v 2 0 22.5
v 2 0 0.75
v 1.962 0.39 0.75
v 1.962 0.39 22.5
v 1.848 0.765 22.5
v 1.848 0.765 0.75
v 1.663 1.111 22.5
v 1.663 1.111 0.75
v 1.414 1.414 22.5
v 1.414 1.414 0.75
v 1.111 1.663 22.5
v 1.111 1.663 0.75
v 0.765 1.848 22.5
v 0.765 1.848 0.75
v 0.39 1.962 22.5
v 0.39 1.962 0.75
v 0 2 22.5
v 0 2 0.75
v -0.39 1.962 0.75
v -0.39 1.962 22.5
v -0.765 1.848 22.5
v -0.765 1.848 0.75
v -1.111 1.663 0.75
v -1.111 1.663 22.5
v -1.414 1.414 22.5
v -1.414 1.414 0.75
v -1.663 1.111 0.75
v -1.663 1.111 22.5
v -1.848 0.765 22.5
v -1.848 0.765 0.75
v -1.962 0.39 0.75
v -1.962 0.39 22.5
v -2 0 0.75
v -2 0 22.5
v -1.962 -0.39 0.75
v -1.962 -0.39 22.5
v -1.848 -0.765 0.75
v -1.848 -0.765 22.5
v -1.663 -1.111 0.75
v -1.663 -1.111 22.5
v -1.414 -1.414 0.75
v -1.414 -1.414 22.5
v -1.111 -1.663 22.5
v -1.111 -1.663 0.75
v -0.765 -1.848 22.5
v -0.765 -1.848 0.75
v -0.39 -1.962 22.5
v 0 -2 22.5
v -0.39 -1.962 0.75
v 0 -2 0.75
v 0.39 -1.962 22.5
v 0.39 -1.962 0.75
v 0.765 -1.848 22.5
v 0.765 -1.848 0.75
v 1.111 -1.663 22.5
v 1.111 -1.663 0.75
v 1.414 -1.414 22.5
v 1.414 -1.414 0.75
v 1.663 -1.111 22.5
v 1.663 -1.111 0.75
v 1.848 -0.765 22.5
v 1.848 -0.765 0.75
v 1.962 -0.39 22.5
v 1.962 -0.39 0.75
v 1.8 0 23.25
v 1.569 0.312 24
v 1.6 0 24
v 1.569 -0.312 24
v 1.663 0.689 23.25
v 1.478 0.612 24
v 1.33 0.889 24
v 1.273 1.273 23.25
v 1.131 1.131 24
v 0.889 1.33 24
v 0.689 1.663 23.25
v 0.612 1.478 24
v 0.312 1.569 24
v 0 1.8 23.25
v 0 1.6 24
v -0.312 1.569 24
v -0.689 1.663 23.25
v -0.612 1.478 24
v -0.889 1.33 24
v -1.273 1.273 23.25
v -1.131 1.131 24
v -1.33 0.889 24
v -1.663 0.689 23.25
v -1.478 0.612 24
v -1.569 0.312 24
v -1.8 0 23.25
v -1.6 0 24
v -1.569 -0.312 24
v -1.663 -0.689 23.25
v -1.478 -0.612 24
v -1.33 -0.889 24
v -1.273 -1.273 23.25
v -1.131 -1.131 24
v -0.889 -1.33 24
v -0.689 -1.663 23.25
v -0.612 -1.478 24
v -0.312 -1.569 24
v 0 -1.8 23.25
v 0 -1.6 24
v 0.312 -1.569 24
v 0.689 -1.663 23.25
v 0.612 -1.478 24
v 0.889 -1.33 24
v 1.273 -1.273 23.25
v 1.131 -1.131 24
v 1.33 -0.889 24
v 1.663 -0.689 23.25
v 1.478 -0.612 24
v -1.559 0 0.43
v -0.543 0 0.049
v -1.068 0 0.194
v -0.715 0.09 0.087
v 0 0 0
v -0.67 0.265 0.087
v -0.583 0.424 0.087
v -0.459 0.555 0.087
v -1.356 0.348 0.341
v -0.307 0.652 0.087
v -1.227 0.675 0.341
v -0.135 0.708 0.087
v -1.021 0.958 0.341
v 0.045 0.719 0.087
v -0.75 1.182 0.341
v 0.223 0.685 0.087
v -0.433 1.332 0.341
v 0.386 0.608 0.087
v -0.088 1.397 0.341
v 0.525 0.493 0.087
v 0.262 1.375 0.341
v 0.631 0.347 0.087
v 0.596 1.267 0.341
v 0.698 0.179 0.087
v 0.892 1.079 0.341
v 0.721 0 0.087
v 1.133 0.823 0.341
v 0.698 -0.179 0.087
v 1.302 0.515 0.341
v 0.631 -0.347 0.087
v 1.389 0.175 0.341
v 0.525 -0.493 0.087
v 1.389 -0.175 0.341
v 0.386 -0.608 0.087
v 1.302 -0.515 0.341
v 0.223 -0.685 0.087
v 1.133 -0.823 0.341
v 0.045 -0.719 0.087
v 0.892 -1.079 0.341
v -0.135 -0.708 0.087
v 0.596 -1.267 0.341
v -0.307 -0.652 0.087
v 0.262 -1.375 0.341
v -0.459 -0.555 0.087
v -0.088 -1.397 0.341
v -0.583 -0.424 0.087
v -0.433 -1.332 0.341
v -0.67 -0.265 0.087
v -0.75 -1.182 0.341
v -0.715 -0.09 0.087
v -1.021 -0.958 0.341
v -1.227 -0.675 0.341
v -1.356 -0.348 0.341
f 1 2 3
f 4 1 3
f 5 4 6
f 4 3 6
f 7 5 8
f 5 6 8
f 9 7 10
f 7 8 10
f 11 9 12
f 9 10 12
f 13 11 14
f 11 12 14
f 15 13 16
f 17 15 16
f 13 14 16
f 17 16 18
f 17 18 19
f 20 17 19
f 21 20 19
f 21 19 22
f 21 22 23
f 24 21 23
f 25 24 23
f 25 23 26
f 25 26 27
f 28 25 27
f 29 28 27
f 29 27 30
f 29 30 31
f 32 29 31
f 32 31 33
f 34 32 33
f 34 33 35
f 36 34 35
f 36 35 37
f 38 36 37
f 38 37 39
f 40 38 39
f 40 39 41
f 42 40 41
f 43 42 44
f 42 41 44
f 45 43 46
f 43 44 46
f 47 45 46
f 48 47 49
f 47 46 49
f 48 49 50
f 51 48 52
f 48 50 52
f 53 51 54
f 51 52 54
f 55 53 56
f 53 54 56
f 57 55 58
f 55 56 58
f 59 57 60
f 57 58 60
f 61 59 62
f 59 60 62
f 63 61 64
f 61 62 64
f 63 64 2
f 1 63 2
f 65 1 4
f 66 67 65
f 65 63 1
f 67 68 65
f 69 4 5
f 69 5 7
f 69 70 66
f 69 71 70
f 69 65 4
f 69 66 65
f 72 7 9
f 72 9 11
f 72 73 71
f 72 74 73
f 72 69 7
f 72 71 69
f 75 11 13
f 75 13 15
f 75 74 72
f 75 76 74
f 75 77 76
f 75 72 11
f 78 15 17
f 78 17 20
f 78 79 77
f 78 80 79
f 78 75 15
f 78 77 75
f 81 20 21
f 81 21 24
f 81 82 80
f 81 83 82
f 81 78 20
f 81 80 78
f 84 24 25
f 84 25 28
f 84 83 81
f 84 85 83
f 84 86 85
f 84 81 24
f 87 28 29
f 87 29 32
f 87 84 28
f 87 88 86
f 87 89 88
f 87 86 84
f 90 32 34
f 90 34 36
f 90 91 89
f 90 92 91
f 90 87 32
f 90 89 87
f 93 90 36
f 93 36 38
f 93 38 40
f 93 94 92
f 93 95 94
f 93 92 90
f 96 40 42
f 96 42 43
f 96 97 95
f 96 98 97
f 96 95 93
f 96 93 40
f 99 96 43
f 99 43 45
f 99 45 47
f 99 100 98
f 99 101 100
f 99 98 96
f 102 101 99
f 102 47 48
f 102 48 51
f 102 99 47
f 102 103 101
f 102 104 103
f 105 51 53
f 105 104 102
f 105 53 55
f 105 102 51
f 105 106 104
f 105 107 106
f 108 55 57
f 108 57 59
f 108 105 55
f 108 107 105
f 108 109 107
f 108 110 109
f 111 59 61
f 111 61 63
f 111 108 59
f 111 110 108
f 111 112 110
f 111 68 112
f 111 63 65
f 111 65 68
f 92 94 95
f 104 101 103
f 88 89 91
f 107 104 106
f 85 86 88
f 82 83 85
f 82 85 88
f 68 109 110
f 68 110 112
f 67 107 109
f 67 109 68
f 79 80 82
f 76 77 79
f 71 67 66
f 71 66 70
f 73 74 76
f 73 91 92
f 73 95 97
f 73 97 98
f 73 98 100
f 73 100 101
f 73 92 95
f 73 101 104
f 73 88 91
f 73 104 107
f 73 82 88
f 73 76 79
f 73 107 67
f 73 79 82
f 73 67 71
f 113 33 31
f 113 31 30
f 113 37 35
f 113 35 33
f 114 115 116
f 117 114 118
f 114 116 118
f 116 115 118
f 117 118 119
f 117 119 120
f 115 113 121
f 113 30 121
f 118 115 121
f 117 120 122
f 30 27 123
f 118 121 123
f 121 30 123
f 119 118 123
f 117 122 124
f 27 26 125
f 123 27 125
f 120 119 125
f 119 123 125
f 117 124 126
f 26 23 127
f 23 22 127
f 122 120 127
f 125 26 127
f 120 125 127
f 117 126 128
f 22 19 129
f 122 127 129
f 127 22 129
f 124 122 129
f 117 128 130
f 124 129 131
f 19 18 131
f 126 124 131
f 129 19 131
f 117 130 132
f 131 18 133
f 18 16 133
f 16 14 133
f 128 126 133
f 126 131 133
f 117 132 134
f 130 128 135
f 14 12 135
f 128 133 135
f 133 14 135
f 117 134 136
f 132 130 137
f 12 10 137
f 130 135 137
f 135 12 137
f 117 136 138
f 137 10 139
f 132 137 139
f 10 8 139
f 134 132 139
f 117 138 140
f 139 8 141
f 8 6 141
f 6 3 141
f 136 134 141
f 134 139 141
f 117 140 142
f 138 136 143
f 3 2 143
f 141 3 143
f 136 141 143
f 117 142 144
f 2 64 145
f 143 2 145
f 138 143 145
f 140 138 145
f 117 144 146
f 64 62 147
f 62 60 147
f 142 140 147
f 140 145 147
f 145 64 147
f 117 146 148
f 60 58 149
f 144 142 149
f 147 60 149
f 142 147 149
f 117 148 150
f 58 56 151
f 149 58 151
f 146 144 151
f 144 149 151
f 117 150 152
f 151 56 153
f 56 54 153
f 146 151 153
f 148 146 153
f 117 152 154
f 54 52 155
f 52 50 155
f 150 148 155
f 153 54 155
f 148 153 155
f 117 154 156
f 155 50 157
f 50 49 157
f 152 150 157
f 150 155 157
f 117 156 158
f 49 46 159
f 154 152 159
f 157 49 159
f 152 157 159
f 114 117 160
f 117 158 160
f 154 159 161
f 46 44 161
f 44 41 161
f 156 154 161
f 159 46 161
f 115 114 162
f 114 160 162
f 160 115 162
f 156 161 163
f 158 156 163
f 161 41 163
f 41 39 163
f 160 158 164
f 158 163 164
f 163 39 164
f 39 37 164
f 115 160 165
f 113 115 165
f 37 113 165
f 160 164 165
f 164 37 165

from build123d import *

# Parameters (mm, degrees)
CROQUIS1_R              = 2
SALIENTE_EXTRUIR1_DEPTH = 24
CHAFL_N1_SIZE           = 1.5
CHAFL_N1_SIZE2          = 0.4


with BuildPart() as part:
    # Croquis1 → Saliente-Extruir1 (new body)
    with BuildSketch(Plane.XY):
        Circle(CROQUIS1_R)
    extrude(amount=SALIENTE_EXTRUIR1_DEPTH)

    # Croquis2 → Cortar-Revolución3 (revolve, cut)
    with BuildSketch(Plane(origin=(0, 0, 0), x_dir=(1, 0, 0), z_dir=(0, 1, 0))):
        with BuildLine():
            Line((-2, -0.75), (-2, 0))
            Line((-2, 0), (-2, 0.2))
            Line((-2, 0.2), (0, 0.2))
            Line((0, 0.2), (0, 0))
            ThreePointArc((0, 0), (-1.068000468, -0.193665418), (-2, -0.75))
        make_face()
    revolve(axis=Axis((0, 0, 24), (0, 0, -1)), mode=Mode.SUBTRACT)

    # Chaflán1
    chafl_n1_edges = [part.edges().sort_by_distance(p)[0] for p in [
        (-2, 0, 24),
    ]]
    chafl_n1_side = [part.faces().sort_by_distance(p)[0] for p in [
        (-2, 0, 12.375),
    ]]
    chamfer(chafl_n1_edges, length=CHAFL_N1_SIZE, length2=CHAFL_N1_SIZE2, reference=chafl_n1_side[0])


solid = part.part
